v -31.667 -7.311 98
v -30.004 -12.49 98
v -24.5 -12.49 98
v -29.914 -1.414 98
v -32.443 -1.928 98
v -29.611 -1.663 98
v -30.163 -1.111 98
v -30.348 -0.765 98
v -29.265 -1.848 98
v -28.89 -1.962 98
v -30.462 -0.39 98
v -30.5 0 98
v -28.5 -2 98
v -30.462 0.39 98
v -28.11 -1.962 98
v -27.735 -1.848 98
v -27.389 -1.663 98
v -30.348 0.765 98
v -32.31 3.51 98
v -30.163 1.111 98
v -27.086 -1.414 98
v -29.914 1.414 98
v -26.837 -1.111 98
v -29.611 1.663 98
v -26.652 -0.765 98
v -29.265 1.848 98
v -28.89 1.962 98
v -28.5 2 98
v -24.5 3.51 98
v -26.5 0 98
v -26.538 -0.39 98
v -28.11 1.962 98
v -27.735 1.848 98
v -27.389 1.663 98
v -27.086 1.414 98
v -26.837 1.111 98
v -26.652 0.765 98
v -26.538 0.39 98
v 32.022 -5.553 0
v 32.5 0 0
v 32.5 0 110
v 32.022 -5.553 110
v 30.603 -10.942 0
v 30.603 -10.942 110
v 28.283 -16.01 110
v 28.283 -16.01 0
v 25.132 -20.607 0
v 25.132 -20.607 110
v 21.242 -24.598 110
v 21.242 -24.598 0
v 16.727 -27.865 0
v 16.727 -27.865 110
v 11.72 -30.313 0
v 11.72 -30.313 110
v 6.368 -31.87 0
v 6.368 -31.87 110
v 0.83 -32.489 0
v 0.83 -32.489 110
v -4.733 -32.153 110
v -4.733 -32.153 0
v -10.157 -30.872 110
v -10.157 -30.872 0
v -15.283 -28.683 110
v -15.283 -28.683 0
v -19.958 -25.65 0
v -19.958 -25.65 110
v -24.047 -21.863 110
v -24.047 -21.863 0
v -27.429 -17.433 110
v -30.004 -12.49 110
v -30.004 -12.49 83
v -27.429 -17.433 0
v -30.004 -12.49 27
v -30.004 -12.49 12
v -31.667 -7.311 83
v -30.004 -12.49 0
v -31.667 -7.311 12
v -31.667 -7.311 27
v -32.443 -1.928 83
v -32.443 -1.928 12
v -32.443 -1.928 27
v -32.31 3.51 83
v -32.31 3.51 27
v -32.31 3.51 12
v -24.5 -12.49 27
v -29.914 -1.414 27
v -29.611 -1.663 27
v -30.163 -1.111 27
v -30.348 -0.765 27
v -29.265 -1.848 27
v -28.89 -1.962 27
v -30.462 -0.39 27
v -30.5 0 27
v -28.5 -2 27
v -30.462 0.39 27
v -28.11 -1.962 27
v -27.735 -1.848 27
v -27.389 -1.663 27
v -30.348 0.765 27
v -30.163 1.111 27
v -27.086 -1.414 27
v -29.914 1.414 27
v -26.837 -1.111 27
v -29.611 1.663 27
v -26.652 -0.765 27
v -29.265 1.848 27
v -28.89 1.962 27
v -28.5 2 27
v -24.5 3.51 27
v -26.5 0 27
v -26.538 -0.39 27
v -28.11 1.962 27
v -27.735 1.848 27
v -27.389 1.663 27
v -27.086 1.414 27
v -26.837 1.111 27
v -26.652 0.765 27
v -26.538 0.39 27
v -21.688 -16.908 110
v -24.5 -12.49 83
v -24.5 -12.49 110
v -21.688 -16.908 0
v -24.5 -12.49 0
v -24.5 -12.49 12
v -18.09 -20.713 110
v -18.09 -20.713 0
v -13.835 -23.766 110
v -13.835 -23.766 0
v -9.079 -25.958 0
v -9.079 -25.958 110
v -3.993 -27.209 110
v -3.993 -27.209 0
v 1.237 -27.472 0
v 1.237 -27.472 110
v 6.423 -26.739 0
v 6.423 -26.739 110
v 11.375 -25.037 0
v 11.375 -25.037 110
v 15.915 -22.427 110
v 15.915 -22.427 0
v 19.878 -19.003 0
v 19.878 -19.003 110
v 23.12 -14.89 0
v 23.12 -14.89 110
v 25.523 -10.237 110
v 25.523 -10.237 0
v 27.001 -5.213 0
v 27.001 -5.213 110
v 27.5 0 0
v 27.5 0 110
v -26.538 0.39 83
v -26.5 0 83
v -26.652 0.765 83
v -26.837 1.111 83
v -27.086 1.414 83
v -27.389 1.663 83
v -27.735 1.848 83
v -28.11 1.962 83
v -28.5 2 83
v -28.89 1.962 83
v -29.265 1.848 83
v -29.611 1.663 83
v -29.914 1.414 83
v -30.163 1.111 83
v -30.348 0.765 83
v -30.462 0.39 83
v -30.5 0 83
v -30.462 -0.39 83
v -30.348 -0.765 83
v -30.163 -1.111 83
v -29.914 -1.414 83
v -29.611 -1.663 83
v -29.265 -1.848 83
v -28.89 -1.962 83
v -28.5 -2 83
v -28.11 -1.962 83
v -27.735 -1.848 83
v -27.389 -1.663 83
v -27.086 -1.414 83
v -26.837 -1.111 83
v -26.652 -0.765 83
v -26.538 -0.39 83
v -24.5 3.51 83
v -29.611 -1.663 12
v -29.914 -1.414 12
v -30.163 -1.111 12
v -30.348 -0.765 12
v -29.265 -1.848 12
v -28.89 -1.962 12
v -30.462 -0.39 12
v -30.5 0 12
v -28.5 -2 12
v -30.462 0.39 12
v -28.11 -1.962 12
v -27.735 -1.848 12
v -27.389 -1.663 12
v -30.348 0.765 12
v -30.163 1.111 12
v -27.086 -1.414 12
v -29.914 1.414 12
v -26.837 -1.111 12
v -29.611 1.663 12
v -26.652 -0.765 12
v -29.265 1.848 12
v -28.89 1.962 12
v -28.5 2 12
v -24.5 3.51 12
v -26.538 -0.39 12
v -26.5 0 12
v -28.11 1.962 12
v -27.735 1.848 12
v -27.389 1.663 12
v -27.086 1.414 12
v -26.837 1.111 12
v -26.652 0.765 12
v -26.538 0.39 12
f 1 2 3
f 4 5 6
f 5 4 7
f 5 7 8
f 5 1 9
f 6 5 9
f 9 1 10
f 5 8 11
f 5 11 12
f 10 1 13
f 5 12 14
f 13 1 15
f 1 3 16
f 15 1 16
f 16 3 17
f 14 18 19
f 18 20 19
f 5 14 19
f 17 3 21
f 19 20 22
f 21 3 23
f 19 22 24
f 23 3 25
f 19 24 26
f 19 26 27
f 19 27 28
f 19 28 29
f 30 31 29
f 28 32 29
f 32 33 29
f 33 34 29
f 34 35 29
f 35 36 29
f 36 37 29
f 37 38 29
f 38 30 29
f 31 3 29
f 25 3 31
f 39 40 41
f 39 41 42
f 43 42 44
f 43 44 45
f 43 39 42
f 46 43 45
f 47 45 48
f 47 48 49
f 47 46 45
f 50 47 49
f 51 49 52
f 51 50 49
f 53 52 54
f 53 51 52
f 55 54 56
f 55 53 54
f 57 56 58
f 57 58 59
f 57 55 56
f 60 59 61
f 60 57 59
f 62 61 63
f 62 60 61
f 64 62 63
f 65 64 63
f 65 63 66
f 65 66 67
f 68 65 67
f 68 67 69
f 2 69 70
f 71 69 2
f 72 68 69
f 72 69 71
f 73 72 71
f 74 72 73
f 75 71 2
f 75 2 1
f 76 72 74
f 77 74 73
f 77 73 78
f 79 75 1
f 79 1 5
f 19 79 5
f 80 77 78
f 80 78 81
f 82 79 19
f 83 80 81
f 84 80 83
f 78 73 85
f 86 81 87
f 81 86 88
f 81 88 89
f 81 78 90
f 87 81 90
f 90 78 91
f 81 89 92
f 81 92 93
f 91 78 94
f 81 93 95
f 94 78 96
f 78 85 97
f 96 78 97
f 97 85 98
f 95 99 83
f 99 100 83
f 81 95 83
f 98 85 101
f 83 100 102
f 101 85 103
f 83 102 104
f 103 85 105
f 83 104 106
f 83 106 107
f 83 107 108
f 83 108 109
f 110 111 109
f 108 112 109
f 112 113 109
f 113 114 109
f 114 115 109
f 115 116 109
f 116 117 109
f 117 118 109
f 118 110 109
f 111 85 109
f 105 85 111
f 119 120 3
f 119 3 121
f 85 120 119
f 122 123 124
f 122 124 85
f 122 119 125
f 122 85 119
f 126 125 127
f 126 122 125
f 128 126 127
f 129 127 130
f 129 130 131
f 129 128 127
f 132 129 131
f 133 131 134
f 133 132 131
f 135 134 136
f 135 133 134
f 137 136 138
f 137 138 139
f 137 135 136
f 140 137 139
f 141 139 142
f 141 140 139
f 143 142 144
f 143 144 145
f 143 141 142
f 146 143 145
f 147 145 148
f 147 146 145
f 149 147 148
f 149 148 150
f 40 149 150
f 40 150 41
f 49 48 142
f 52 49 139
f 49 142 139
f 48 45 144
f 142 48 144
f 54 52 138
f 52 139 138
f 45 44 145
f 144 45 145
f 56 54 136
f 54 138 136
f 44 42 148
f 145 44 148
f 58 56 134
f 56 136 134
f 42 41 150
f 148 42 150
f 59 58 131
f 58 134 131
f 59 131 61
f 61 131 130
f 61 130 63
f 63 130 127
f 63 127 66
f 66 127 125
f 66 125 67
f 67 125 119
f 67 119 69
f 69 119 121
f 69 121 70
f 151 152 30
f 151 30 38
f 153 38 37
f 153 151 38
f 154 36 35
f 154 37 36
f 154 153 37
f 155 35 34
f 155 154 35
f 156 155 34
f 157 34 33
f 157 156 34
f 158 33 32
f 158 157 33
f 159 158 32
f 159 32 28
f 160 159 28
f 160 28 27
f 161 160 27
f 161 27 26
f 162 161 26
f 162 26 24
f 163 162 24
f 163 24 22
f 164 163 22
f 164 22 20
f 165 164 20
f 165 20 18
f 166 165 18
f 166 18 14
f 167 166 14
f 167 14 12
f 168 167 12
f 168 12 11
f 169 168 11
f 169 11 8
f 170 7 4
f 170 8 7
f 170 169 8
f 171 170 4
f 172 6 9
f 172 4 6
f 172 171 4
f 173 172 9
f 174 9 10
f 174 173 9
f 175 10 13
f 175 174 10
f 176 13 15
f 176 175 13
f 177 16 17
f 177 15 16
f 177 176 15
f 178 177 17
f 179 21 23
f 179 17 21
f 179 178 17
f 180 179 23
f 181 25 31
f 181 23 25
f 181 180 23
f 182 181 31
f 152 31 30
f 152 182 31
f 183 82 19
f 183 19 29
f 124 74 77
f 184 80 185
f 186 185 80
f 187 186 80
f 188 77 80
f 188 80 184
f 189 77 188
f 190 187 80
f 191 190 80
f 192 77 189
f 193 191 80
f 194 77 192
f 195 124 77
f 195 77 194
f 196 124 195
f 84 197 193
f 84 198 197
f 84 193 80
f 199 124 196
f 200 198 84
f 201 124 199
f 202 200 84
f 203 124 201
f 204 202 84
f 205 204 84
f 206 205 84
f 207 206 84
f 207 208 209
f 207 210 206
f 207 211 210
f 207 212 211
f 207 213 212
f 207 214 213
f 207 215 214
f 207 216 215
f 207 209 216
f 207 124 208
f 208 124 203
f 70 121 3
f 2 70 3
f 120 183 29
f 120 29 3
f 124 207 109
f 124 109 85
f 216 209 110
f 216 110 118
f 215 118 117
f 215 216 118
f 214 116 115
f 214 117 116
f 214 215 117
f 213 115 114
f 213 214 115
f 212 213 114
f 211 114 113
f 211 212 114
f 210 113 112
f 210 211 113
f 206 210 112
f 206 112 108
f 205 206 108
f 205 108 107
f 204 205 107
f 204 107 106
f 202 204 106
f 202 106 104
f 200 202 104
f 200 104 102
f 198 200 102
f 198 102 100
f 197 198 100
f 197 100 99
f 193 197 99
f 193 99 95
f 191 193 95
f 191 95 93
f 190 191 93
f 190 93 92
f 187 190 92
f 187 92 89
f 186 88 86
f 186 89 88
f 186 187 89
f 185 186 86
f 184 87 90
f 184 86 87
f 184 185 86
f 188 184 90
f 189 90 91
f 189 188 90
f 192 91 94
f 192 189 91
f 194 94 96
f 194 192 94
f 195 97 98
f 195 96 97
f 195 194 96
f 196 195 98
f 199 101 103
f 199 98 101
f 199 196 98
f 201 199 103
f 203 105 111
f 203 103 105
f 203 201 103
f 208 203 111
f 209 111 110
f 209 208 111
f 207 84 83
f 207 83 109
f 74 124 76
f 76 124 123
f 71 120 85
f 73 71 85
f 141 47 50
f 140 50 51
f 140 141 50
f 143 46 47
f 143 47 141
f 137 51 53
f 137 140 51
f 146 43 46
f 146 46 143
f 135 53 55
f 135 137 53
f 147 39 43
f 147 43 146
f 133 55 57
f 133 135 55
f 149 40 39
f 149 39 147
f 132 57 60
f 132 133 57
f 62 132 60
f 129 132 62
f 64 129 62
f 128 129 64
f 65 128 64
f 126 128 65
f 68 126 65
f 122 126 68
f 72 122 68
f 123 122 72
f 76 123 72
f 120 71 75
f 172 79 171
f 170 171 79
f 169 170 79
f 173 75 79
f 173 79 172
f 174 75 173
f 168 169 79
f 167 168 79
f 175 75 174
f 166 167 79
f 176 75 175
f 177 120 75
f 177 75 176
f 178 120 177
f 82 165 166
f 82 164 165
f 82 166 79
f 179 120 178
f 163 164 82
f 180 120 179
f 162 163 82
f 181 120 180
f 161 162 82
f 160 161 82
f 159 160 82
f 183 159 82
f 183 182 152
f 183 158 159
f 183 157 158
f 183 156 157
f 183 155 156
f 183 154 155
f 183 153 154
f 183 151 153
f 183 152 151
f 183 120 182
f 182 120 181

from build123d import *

# Parameters (mm, degrees)
CROQUIS2_R       = 2
PAREDMOVIL_DEPTH = 110
VISAGRA_REACH    = 130.083
CROQUIS3_W       = 12
CROQUIS3_H       = 16
CROQUIS3_W_2     = 56


with BuildPart() as part:
    # Croquis2 → ParedMovil (new body)
    with BuildSketch(Plane.XY):
        with BuildLine():
            Line((27.5, 0), (32.5, 0))
            ThreePointArc((32.5, 0), (-1.757573948, -32.452441107), (-32.309903619, 3.510004003))
            Line((-32.309903619, 3.510004003), (-24.5, 3.510004003))
            Line((-24.5, 3.510004003), (-24.5, -12.489995997))
            ThreePointArc((-24.5, -12.489995997), (6.422616289, -26.739483914), (27.5, 0))
        make_face()
        with Locations((-28.5, 0)):
            Circle(CROQUIS2_R, mode=Mode.SUBTRACT)
    extrude(amount=PAREDMOVIL_DEPTH)

    # Croquis3 → Visagra (cut, up to next)
    with BuildSketch(Plane(origin=(-24.5, 0, 0), x_dir=(0, 0, -1), z_dir=(1, 0, 0)), mode=Mode.PRIVATE) as visagra_sk1:
        with Locations((-104, -4.489995997)):
            Rectangle(CROQUIS3_W, CROQUIS3_H)
    visagra_tool1 = extrude(visagra_sk1.sketch, amount=-VISAGRA_REACH, mode=Mode.PRIVATE) & part.part
    # Croquis3 → Visagra (cut, up to next)
    with BuildSketch(Plane(origin=(-24.5, 0, 0), x_dir=(0, 0, -1), z_dir=(1, 0, 0)), mode=Mode.PRIVATE) as visagra_sk2:
        with Locations((-6, -4.489995997)):
            Rectangle(CROQUIS3_W, CROQUIS3_H)
    visagra_tool2 = extrude(visagra_sk2.sketch, amount=-VISAGRA_REACH, mode=Mode.PRIVATE) & part.part
    # Croquis3 → Visagra (cut, up to next)
    with BuildSketch(Plane(origin=(-24.5, 0, 0), x_dir=(0, 0, -1), z_dir=(1, 0, 0)), mode=Mode.PRIVATE) as visagra_sk3:
        with Locations((-55, -4.489995997)):
            Rectangle(CROQUIS3_W_2, CROQUIS3_H)
    visagra_tool3 = extrude(visagra_sk3.sketch, amount=-VISAGRA_REACH, mode=Mode.PRIVATE) & part.part
    add(visagra_tool1.solids().sort_by_distance((-24.5, -4.489996, 104))[0], mode=Mode.SUBTRACT)
    add(visagra_tool2.solids().sort_by_distance((-24.5, -4.489996, 6))[0], mode=Mode.SUBTRACT)
    add(visagra_tool3.solids().sort_by_distance((-24.5, -4.489996, 55))[0], mode=Mode.SUBTRACT)


solid = part.part
